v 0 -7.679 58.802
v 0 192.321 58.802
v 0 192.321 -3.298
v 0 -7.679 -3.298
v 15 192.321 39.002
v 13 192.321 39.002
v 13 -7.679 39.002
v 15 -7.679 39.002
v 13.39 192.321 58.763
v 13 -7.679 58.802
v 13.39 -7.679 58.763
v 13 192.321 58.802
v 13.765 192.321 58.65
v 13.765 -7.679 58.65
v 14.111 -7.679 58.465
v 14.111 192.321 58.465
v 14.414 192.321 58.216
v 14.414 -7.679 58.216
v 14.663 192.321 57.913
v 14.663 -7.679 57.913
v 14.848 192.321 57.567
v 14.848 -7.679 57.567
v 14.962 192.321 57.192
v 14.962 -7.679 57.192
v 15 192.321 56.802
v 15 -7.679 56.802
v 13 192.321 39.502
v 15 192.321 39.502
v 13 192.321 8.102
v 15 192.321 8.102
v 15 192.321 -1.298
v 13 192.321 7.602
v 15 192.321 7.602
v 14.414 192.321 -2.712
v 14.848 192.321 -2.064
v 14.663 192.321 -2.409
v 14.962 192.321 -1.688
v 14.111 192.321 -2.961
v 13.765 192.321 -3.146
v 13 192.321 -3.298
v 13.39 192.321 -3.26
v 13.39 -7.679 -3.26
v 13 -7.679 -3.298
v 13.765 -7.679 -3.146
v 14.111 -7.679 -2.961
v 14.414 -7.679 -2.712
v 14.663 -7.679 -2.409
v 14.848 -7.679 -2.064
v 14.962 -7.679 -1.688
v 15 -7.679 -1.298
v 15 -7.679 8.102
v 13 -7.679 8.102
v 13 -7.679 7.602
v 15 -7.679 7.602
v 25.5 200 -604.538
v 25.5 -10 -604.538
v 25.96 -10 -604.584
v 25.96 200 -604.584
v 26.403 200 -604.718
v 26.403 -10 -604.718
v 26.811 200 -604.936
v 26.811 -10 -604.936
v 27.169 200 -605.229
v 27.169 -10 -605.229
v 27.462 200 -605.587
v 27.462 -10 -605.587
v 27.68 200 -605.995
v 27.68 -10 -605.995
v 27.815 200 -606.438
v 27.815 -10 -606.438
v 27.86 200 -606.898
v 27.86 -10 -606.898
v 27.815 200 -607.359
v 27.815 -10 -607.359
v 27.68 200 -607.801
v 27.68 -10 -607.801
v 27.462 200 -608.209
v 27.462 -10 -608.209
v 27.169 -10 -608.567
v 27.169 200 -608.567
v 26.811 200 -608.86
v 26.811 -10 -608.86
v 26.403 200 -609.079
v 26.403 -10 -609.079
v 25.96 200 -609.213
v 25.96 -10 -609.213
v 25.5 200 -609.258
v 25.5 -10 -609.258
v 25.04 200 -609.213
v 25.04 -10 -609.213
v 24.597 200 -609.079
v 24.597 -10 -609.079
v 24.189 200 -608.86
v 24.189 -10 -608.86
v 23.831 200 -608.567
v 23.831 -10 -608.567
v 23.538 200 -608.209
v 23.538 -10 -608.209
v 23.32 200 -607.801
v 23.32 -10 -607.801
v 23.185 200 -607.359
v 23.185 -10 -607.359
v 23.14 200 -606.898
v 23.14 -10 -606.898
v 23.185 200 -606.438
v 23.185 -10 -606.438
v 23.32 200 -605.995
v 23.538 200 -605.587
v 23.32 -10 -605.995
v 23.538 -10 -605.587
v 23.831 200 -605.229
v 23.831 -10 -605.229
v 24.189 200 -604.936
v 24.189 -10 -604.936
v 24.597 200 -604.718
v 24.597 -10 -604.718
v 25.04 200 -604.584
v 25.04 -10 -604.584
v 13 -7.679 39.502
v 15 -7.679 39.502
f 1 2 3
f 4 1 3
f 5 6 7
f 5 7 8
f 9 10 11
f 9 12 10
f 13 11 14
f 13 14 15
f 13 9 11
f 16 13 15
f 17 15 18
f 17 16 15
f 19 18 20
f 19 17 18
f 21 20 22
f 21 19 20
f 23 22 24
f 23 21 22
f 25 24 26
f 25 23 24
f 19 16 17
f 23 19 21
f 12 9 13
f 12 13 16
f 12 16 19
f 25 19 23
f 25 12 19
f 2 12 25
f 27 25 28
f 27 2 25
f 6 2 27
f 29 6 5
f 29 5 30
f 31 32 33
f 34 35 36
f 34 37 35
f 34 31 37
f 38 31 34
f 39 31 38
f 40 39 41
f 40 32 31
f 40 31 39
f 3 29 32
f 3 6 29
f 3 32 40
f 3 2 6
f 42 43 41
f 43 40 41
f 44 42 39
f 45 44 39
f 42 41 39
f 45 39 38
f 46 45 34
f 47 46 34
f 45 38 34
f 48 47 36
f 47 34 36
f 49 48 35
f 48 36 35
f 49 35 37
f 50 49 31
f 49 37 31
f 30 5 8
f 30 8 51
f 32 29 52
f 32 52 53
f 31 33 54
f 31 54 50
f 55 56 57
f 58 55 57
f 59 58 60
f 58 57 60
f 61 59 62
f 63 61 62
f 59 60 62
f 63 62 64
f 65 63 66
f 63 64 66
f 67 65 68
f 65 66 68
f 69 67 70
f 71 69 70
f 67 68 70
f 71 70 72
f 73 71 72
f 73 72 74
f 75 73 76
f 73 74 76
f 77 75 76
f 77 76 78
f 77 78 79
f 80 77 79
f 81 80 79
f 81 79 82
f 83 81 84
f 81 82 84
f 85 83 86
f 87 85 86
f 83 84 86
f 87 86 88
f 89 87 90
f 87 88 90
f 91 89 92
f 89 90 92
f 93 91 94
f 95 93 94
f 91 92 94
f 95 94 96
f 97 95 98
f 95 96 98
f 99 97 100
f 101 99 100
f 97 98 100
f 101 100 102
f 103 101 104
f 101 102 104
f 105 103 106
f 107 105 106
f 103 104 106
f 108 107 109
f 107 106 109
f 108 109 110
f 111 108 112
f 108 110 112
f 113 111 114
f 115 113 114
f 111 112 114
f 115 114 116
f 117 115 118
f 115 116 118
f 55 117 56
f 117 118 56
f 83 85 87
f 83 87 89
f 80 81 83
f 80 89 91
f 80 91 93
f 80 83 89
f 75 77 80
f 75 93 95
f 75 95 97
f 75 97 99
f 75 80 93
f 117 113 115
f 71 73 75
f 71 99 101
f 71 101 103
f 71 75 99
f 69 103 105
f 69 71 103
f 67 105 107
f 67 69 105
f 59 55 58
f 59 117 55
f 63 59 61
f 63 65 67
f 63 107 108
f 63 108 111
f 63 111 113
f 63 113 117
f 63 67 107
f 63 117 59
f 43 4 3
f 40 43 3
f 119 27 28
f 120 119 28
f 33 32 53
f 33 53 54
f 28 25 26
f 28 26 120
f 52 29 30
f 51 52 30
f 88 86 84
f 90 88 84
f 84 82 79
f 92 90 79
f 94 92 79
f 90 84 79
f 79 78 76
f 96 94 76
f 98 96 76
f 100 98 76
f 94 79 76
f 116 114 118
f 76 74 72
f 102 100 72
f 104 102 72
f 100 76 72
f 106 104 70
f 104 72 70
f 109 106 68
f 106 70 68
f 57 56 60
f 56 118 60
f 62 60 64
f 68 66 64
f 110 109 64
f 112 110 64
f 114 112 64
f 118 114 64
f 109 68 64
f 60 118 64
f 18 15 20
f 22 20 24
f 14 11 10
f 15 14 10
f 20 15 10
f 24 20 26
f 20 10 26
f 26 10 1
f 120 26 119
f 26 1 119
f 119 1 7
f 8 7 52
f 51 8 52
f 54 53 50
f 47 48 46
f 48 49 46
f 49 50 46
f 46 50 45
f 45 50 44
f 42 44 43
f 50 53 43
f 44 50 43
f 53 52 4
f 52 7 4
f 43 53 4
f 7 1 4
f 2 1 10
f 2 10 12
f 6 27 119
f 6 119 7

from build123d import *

# Parameters (mm, degrees)
SKETCH_1_W          = 62.1
SKETCH_1_H          = 200
EXTRUDE_1_DEPTH     = 15
SKETCH_2_W          = 2
SKETCH_2_H          = 0.5
CUT_EXTRUDE_1_DEPTH = 210.003939351
FILLET_1_R          = 2
EXTRUDE_START       = -10
SKETCH_3_R          = 2.359977166
EXTRUDE_2_DEPTH     = 210


with BuildPart() as part:
    # Эскиз1 → Бобышка-Вытянуть1 (new body)
    with BuildSketch(Plane(origin=(0, 0, 0), x_dir=(0, 0, -1), z_dir=(1, 0, 0))):
        with Locations((-27.751757321, 92.321211536)):
            Rectangle(SKETCH_1_W, SKETCH_1_H)
    extrude(amount=EXTRUDE_1_DEPTH)

    # Эскиз2 → Вырез-Вытянуть1 (cut, through all)
    with BuildSketch(Plane(origin=(0, 192.321211536, 0), x_dir=(1, 0, 0), z_dir=(0, 1, 0))):
        with Locations((14, -39.251757321)):
            Rectangle(SKETCH_2_W, SKETCH_2_H)
        with Locations((14, -7.851757321)):
            Rectangle(SKETCH_2_W, SKETCH_2_H)
    extrude(amount=-CUT_EXTRUDE_1_DEPTH, mode=Mode.SUBTRACT)

    # Скругление1
    fillet_1_edges = [part.edges().sort_by_distance(p)[0] for p in [
        (15, 92.321211536, -3.298242679),
        (15, 92.321211536, 58.801757321),
    ]]
    fillet(fillet_1_edges, radius=FILLET_1_R)


with BuildPart() as body_2:
    # Эскиз3 → Бобышка-Вытянуть2 (new body)
    with BuildSketch(Plane(origin=(0, 0, 0), x_dir=(1, 0, 0), z_dir=(0, 1, 0)).offset(EXTRUDE_START)):
        with Locations(Location((25.5, 606.898242679, 0), (0, 0, 270))):
            Circle(SKETCH_3_R)
    extrude(amount=EXTRUDE_2_DEPTH)


solid = Compound([part.part, body_2.part])
